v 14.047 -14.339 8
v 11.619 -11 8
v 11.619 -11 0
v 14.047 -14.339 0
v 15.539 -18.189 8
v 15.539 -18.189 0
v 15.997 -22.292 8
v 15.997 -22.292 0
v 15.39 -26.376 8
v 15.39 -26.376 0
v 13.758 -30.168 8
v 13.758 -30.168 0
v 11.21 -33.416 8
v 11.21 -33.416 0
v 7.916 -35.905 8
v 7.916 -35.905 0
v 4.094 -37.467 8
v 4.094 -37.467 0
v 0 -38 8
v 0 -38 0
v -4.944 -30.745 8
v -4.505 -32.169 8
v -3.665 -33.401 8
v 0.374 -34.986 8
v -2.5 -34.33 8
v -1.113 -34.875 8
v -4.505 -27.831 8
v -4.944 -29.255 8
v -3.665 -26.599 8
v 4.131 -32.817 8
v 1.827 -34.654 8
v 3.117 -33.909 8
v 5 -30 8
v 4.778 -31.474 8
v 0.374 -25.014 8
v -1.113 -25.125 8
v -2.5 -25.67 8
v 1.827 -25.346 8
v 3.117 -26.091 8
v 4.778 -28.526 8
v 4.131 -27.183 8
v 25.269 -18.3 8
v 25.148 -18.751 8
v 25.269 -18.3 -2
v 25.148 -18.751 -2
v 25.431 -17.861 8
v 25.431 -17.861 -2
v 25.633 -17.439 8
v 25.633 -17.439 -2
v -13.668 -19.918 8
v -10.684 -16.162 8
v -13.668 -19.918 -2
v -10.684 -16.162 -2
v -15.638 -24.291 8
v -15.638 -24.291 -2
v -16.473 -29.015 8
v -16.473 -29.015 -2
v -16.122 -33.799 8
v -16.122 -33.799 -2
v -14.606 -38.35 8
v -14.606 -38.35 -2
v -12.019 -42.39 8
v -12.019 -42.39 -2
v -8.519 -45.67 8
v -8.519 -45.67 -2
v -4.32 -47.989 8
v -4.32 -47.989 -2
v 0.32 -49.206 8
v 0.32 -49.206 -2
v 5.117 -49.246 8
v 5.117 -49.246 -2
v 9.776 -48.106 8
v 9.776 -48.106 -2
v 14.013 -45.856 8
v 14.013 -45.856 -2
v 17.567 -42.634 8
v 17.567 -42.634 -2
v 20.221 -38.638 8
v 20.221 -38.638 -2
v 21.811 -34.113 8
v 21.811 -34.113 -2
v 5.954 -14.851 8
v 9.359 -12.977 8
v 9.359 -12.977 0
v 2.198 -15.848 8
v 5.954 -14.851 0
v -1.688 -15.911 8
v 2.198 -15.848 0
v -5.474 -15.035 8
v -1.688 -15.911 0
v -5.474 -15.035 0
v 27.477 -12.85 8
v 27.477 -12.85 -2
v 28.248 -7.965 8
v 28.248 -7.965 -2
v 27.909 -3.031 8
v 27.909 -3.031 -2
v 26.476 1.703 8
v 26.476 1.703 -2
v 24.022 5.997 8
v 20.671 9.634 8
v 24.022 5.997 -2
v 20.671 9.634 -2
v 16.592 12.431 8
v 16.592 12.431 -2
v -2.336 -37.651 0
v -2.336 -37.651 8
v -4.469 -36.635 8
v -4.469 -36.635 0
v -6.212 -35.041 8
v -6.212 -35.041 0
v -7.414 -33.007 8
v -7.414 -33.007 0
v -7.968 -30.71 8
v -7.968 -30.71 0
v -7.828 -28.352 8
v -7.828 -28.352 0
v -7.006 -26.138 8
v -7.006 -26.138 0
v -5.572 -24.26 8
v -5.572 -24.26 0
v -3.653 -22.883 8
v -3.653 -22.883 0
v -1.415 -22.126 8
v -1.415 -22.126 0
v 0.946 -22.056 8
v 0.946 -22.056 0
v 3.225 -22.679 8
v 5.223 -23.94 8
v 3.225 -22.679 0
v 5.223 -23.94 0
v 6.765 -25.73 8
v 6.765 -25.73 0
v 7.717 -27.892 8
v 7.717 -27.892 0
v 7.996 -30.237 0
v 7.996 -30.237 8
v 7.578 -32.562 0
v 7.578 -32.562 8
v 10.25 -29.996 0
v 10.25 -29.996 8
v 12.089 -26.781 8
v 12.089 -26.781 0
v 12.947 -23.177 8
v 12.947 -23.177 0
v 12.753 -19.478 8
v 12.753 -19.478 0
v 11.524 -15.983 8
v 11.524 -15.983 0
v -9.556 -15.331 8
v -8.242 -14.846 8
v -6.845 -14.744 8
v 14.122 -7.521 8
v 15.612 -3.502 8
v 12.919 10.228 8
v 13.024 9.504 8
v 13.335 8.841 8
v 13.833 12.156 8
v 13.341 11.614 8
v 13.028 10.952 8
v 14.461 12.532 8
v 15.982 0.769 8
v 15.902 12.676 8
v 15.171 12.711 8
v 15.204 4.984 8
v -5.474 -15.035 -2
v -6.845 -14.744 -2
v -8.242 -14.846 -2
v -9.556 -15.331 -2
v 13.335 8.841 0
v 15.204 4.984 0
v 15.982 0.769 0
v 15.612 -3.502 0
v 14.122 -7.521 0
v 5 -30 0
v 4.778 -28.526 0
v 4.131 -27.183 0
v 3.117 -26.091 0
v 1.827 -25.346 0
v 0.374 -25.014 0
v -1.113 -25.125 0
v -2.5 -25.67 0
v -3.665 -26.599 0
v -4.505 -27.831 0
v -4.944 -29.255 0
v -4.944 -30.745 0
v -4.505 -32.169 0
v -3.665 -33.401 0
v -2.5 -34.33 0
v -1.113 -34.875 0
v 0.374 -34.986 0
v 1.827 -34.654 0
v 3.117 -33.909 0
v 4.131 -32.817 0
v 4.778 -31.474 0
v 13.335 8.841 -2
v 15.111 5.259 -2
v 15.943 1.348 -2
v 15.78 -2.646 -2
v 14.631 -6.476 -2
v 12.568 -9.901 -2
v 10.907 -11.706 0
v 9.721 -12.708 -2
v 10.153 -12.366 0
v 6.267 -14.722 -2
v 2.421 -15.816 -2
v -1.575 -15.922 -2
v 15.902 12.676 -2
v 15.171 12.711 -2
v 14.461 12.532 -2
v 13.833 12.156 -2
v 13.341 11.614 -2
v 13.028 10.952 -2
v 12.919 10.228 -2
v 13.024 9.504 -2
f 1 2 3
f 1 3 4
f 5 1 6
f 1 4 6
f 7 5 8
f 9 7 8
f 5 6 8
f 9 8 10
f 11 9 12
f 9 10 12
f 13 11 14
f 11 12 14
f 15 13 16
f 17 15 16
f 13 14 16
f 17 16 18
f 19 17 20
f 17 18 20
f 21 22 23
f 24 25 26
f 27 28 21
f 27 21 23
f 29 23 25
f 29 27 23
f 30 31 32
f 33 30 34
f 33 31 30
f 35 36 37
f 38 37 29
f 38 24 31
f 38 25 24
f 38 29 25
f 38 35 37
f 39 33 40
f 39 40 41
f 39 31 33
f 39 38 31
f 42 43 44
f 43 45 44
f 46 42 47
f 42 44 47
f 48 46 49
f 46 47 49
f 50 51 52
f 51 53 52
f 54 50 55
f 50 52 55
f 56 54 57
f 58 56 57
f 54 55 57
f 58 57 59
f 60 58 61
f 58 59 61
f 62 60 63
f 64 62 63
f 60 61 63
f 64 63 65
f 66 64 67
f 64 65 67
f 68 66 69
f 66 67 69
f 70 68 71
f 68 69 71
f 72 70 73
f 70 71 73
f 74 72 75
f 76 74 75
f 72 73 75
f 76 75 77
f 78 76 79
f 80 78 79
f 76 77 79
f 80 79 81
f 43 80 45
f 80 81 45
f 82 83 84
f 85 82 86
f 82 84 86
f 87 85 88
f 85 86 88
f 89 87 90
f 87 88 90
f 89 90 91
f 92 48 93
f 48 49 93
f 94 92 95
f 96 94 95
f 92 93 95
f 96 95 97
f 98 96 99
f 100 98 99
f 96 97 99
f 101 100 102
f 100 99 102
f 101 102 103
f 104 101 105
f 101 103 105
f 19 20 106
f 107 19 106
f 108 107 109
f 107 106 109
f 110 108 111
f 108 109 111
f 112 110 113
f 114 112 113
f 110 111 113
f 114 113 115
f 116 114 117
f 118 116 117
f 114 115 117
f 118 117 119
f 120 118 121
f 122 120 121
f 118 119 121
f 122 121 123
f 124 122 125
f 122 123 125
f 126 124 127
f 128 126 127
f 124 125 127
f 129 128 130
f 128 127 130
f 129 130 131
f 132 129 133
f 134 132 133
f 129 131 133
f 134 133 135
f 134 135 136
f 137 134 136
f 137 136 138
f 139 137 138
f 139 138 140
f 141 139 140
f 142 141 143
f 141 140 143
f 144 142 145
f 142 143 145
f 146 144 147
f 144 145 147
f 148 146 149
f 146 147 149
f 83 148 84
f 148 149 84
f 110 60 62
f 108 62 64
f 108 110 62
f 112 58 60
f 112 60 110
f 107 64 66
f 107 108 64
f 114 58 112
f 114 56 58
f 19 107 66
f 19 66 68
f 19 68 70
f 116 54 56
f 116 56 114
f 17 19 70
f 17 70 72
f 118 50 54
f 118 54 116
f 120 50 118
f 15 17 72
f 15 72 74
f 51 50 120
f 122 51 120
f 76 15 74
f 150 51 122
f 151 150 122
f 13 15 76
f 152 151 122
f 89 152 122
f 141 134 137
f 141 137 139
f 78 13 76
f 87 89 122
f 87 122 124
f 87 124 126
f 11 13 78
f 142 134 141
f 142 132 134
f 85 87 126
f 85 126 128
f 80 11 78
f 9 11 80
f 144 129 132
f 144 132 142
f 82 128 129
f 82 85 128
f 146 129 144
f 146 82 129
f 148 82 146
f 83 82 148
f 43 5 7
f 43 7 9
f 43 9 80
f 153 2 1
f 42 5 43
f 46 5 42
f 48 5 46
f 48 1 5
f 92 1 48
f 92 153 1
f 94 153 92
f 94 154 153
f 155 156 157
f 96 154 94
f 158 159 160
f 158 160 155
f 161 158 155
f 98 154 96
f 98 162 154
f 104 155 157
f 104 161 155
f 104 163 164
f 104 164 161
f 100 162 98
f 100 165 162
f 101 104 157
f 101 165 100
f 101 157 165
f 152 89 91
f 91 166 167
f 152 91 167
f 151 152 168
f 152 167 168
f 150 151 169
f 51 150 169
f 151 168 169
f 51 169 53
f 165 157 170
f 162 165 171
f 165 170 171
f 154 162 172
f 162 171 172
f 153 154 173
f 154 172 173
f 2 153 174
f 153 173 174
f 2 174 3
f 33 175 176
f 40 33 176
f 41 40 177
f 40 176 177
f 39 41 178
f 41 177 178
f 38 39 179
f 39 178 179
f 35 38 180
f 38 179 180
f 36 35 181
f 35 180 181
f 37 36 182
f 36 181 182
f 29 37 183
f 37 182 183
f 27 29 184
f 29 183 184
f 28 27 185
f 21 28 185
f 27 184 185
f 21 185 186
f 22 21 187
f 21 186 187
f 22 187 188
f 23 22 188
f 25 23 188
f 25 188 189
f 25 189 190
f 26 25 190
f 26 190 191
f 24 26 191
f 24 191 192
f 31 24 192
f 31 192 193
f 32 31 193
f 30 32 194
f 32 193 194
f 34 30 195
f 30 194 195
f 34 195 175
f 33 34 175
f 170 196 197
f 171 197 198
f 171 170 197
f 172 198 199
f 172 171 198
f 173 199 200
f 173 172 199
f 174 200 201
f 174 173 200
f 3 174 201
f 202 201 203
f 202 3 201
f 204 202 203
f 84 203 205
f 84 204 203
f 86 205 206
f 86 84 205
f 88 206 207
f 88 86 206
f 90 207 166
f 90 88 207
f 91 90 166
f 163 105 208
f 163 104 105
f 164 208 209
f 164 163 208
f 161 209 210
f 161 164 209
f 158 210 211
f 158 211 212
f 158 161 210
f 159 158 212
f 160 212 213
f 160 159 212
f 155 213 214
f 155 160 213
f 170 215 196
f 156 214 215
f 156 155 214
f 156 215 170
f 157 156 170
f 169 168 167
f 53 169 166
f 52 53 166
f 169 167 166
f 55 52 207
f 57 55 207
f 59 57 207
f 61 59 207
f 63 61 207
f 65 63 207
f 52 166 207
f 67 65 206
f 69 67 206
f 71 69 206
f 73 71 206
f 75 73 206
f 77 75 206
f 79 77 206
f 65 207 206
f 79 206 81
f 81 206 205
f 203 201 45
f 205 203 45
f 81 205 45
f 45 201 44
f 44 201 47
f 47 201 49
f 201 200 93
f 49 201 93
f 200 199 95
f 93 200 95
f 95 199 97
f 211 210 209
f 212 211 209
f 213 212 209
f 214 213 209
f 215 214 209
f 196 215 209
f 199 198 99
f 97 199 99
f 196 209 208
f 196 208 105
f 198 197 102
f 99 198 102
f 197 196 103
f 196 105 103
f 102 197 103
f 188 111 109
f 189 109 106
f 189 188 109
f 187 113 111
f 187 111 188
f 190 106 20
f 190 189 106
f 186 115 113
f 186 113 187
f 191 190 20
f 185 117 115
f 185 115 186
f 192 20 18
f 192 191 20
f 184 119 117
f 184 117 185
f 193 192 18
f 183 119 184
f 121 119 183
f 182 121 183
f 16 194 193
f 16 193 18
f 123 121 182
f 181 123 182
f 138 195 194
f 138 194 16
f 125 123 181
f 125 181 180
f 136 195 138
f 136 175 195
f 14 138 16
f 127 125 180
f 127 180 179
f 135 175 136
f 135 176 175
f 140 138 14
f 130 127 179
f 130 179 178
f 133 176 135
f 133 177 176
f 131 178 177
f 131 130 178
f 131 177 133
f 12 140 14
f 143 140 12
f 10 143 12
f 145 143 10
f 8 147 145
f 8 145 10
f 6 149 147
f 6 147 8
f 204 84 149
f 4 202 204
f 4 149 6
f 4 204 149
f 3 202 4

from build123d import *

# Parameters (mm, degrees)
F2_DEPTH = 2
F0_R     = 5
F3_DEPTH = 8


with BuildPart() as f2:
    # F1 (on Top) → F2 (new body)
    with BuildSketch(Plane.XY):
        with BuildLine():
            ThreePointArc((13.3352901354, 8.8413820755), (12.5684052501, -9.9012721137), (-5.473909682, -15.0345040754))
            ThreePointArc((-5.473909682, -15.0345040754), (-8.2417855801, -14.8458488198), (-10.6841578939, -16.1617307572))
            ThreePointArc((-10.6841578939, -16.1617307572), (-6.49143908, -46.9599083827), (21.8114936554, -34.112705003))
            Line((21.8114936554, -34.112705003), (25.1481622756, -18.7513405658))
            ThreePointArc((25.1481622756, -18.7513405658), (25.3446435428, -18.0783456566), (25.6333270757, -17.4394490656))
            ThreePointArc((25.6333270757, -17.4394490656), (27.3258914034, -0.6237467424), (16.5919494859, 12.4305670861))
            ThreePointArc((16.5919494859, 12.4305670861), (13.5674787289, 11.902767988), (13.3352901354, 8.8413820755))
        make_face()
    extrude(amount=-F2_DEPTH)

    # F0 (on Top) → F3 (join)
    with BuildSketch(Plane.XY):
        with BuildLine():
            ThreePointArc((9.3589739054, -12.9772727273), (2.1980630587, -15.8482970312), (-5.473909682, -15.0345040754))
            ThreePointArc((-5.473909682, -15.0345040754), (-8.2417855801, -14.8458488198), (-10.6841578939, -16.1617307572))
            ThreePointArc((-10.6841578939, -16.1617307572), (-6.49143908, -46.9599083827), (21.8114936554, -34.112705003))
            Line((21.8114936554, -34.112705003), (25.1481622756, -18.7513405658))
            ThreePointArc((25.1481622756, -18.7513405658), (25.3446435428, -18.0783456566), (25.6333270757, -17.4394490656))
            ThreePointArc((25.6333270757, -17.4394490656), (27.3258914034, -0.6237467424), (16.5919494859, 12.4305670861))
            ThreePointArc((16.5919494859, 12.4305670861), (13.5674787289, 11.902767988), (13.3352901354, 8.8413820755))
            ThreePointArc((13.3352901354, 8.8413820755), (15.9404716471, -1.3788994408), (11.6189500386, -11))
            ThreePointArc((11.6189500386, -11), (14.6969384567, -28.3245553203), (0, -38))
            ThreePointArc((0, -38), (-4.6636895265, -23.5), (7.5784954806, -32.5625))
            ThreePointArc((7.5784954806, -32.5625), (12.9466114923, -23.1769668084), (9.3589739054, -12.9772727273))
        make_face()
        with Locations((0, -30)):
            Circle(F0_R)
    extrude(amount=F3_DEPTH)


solid = f2.part
